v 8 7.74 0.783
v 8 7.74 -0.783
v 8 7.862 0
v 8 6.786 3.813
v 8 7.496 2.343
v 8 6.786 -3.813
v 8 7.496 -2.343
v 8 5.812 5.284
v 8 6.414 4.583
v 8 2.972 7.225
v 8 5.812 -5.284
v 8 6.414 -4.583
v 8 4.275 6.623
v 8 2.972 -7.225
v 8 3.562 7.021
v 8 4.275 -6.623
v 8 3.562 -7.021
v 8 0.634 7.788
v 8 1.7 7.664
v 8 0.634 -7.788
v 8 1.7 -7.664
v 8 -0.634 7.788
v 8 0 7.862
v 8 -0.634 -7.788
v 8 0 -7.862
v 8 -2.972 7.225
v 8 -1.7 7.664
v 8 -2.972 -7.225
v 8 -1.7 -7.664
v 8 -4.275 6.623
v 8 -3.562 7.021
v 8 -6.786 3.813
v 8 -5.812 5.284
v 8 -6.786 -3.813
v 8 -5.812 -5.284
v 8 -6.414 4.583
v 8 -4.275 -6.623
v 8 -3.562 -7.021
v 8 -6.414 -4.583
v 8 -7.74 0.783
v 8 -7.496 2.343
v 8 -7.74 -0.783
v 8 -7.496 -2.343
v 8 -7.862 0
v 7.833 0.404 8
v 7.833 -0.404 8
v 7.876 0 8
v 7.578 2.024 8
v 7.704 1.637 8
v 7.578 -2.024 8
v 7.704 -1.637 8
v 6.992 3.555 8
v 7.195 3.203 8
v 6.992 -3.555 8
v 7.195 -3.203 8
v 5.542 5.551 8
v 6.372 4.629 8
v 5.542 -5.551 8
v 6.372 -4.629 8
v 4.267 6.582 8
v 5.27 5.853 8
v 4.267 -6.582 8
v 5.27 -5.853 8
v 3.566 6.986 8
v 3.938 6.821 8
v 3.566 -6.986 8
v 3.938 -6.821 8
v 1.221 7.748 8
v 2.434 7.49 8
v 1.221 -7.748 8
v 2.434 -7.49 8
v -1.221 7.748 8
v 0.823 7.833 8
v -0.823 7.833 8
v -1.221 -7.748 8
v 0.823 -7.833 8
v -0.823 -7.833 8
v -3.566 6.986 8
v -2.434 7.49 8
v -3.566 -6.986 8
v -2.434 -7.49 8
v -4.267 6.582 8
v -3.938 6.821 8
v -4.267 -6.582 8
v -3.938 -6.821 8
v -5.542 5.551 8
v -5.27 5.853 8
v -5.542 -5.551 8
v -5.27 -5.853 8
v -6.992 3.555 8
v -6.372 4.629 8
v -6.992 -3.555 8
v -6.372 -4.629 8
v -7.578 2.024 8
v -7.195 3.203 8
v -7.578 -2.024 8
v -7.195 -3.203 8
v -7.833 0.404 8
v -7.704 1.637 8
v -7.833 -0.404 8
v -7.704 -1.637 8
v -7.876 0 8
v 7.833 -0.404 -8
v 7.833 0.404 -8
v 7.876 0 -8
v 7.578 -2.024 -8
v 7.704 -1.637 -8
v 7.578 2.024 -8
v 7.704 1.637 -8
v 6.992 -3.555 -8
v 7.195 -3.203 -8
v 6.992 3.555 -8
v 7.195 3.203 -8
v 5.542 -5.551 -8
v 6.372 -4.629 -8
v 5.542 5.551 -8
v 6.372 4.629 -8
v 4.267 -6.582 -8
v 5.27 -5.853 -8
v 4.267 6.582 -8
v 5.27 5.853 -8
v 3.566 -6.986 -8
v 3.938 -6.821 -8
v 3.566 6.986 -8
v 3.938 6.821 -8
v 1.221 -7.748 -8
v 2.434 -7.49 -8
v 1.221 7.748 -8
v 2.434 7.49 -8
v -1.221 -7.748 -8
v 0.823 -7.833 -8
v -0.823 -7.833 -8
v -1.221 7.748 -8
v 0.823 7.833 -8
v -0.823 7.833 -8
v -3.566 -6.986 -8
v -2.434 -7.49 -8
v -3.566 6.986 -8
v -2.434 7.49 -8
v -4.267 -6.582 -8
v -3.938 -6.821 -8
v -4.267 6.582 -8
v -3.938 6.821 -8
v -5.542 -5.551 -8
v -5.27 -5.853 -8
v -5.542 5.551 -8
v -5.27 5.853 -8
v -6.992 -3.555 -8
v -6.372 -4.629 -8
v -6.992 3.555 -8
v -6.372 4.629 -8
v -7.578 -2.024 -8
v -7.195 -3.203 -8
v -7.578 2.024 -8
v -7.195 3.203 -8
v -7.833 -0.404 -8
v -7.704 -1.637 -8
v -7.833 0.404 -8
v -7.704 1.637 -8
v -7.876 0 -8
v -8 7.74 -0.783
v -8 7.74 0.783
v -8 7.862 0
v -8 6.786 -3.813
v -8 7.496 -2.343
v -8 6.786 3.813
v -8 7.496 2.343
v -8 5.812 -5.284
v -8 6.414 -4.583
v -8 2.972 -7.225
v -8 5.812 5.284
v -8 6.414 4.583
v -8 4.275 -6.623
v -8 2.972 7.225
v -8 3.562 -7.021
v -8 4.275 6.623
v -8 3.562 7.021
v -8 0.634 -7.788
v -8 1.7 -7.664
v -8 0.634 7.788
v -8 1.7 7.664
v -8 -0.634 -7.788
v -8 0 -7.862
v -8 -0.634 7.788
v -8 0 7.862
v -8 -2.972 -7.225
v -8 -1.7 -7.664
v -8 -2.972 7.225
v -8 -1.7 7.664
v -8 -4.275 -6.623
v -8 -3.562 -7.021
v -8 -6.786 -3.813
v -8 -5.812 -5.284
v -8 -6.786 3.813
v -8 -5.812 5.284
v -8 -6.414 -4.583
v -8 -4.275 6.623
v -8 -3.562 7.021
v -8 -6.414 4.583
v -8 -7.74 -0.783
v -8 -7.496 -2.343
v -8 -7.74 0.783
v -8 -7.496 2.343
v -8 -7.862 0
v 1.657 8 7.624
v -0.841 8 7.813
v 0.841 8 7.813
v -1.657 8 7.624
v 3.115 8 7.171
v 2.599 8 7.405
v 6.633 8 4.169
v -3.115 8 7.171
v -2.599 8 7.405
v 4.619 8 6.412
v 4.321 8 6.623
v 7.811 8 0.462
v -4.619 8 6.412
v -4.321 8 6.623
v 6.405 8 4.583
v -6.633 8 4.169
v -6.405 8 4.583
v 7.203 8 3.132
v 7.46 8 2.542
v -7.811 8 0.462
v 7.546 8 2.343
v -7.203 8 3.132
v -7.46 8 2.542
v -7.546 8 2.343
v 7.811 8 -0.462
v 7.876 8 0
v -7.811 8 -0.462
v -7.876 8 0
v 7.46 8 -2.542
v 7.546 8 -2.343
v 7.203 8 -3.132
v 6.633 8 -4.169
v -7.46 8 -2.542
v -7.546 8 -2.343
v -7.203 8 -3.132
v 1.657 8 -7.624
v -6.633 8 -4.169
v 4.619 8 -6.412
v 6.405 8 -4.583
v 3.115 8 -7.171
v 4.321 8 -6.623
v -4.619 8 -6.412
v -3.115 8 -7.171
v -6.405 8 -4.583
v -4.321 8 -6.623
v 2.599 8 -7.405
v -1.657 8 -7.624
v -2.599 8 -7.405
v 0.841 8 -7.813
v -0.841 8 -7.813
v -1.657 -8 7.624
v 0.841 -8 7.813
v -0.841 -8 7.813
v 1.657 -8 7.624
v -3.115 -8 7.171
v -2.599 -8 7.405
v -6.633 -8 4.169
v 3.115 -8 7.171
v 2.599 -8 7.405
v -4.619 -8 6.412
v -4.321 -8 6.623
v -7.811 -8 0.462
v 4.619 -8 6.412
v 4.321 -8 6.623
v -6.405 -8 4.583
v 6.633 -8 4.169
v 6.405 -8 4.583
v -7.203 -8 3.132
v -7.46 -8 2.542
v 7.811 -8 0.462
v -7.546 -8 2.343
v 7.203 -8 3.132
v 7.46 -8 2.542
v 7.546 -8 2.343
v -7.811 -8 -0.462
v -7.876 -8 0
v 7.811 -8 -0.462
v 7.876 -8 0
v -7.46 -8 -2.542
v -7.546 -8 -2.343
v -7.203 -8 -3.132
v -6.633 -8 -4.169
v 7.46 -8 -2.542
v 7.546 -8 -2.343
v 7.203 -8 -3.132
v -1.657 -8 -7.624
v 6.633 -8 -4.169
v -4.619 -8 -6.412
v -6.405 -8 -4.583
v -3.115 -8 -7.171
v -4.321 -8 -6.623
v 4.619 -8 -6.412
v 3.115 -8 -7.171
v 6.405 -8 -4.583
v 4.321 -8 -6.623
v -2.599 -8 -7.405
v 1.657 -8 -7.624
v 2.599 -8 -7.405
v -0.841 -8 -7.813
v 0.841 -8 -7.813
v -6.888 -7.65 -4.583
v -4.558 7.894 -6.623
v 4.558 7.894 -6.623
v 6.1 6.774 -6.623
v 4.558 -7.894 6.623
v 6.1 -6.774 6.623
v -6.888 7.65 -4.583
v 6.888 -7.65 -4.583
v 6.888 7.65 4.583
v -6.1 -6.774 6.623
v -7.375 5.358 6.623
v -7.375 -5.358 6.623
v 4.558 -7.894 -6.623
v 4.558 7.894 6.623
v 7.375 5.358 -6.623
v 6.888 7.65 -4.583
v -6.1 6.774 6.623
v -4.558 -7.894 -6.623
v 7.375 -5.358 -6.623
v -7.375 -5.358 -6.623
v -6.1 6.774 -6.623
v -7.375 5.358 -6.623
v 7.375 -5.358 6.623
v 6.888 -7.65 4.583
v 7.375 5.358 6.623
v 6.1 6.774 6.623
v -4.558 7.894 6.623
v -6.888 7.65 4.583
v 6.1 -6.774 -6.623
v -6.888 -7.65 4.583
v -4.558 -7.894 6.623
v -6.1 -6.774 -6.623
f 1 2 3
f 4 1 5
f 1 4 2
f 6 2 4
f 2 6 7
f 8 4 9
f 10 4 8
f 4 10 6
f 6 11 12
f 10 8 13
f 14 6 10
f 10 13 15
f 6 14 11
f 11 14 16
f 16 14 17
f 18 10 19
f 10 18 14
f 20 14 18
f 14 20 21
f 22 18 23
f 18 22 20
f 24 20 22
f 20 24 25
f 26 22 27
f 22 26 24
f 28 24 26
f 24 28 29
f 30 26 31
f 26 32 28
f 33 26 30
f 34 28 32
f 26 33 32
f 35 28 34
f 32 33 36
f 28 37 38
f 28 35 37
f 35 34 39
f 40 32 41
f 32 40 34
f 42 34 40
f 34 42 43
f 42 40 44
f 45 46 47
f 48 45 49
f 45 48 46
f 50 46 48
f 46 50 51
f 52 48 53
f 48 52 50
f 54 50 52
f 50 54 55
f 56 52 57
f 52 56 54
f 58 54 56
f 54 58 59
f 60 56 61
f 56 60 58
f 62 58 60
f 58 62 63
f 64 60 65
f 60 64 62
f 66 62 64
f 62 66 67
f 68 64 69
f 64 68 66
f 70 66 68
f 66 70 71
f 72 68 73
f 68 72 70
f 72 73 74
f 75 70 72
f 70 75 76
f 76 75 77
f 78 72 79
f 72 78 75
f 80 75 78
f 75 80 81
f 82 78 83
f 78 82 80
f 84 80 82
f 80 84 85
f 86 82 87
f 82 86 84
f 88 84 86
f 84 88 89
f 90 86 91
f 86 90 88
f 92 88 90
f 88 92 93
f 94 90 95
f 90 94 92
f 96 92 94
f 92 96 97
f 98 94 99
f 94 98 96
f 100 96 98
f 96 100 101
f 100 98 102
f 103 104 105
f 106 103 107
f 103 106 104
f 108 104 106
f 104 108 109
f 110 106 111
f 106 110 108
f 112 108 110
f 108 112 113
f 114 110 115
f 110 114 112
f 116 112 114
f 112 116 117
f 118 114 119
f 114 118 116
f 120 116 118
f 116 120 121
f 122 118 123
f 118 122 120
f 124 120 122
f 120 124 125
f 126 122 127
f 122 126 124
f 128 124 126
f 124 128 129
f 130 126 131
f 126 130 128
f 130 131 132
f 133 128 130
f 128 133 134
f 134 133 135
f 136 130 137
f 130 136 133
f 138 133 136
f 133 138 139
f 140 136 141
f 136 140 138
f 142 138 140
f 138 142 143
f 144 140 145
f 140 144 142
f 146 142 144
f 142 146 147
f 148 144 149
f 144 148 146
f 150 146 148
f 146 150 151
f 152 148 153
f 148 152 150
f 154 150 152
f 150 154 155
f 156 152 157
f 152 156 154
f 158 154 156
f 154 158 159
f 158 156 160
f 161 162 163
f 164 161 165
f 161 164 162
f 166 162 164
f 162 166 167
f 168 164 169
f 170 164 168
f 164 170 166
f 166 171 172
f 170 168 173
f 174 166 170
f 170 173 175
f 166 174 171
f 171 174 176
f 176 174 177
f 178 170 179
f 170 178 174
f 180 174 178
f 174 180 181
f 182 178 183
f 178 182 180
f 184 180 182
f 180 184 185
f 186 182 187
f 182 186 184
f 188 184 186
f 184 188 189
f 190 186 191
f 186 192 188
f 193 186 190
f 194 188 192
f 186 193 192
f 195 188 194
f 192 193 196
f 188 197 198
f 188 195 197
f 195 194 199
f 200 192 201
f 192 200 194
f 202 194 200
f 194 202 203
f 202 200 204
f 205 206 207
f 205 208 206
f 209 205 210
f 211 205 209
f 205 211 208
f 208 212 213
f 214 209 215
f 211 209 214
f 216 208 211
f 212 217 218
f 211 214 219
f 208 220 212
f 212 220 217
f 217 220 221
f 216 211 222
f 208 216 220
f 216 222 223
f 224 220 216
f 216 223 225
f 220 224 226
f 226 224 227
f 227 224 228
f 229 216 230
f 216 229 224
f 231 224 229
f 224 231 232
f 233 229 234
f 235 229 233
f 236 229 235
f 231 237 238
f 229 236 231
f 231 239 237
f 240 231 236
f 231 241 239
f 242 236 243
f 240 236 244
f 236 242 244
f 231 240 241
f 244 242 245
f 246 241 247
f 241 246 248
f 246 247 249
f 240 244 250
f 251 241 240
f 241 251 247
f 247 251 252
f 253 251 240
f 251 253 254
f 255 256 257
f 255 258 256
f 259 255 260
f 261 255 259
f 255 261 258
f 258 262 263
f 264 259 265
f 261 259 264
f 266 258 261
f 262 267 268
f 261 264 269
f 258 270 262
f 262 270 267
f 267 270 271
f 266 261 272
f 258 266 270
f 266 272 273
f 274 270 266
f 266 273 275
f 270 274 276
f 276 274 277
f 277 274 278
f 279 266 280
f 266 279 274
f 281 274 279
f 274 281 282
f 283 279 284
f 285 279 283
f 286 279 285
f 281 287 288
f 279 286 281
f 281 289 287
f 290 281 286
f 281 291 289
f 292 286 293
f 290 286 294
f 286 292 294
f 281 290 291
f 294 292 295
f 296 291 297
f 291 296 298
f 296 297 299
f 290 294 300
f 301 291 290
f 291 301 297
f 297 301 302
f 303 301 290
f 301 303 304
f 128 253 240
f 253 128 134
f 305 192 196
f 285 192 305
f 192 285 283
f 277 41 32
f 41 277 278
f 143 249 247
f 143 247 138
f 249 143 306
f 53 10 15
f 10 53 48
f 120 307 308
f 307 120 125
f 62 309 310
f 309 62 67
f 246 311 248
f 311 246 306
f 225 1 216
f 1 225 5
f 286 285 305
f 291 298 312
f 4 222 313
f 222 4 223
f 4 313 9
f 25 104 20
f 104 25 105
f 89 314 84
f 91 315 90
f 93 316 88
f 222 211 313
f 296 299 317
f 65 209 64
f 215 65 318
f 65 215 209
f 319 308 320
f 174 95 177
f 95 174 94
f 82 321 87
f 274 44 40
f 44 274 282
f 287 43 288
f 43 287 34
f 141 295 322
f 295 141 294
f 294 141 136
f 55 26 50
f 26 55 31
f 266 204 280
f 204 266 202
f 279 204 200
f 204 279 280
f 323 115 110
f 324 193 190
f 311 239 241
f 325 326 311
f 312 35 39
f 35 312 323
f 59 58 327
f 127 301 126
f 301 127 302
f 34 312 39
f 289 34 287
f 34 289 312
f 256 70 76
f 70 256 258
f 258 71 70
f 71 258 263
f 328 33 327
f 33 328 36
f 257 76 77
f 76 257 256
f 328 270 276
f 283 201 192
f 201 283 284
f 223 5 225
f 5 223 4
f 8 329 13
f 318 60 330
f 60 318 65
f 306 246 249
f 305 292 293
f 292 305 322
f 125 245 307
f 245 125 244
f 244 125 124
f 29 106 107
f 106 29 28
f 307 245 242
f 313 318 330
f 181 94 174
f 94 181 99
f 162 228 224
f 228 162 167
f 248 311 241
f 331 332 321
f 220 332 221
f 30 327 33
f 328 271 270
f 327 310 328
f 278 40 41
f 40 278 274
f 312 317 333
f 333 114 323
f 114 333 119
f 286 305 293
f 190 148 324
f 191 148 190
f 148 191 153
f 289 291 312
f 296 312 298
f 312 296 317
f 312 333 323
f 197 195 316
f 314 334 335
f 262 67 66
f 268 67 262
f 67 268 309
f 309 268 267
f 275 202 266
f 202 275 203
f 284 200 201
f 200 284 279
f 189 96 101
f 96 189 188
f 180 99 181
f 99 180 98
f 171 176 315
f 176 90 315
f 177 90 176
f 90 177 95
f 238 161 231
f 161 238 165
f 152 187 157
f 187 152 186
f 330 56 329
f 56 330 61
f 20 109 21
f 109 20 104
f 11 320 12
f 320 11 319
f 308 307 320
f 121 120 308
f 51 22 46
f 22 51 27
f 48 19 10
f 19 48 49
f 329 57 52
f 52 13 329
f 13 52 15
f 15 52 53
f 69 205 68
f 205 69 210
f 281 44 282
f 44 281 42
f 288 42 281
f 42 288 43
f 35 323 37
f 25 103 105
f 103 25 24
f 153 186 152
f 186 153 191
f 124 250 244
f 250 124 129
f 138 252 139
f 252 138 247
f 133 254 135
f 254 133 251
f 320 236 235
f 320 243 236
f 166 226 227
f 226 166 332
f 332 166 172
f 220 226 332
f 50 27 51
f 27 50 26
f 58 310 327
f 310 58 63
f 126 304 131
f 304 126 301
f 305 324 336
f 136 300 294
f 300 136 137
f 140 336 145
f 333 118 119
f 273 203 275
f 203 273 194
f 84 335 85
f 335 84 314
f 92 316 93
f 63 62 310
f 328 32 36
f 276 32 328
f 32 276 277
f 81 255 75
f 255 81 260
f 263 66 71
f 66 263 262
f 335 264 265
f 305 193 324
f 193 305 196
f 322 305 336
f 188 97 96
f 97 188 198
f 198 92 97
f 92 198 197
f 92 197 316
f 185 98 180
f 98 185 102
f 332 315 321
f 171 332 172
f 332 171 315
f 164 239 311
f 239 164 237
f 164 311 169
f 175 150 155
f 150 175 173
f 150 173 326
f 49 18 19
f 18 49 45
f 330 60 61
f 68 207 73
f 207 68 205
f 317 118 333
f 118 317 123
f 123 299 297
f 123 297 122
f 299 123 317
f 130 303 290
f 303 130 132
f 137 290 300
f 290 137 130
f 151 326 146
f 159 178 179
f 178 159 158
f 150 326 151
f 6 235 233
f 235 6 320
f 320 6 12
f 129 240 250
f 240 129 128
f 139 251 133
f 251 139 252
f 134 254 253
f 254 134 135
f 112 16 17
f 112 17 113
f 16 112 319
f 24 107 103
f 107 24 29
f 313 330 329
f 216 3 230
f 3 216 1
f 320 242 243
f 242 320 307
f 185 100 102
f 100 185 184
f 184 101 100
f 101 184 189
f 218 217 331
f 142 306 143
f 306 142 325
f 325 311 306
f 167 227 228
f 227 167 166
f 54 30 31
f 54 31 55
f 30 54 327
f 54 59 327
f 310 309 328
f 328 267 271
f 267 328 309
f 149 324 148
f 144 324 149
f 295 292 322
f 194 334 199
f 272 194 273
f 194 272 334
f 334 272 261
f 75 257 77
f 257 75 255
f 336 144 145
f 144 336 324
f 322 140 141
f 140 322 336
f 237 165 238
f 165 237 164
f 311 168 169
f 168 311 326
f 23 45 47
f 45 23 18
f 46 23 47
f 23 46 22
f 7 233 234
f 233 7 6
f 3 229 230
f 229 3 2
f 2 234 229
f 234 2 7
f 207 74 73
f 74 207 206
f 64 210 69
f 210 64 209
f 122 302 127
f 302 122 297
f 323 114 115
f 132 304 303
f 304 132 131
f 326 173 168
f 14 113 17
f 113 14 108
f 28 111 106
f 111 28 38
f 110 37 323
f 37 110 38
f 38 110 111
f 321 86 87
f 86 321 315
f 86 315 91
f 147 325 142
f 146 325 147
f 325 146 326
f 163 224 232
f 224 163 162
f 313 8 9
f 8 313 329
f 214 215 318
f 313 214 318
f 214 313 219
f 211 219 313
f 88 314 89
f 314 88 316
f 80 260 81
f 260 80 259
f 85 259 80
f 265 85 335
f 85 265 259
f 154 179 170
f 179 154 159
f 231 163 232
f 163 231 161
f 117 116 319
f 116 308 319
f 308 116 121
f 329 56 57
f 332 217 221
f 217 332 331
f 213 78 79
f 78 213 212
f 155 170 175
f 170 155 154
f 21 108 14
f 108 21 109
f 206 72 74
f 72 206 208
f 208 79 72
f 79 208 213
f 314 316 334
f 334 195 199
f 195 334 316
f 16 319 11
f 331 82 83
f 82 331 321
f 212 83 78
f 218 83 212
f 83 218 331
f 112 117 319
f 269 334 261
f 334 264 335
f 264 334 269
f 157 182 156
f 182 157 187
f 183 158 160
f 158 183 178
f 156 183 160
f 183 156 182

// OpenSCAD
// [FL_INDEX: keywords="openscad, 3d_parametric, Customizable_dice_with_engraved_images, csg_solid" | COT="Parametric OpenSCAD design from 3DCodeverse"]
// Title: Customizable dice with engraved images

//Created by Ari M. Diacou, August 2013
//Shared under Creative Commons License: Attribution-ShareAlike 3.0 Unported (CC BY-SA 3.0) 
//see http://creativecommons.org/licenses/by-sa/3.0/

/*To get this to work offline, any image must be converted to a .dat file using the tool at http://customizer.makerbot.com/image_surface. That will output an array of values from 0-1 corresponding to the greyscale values 0-255 of the image. Inverting the colors of the image will ensure that the recessed image gets subracted from other objects properly. Copy the arry to a text file. IMPORTANT: be sure that your file is actually a dat file and not e.g. foo.dat.txt. Some operating systems (like Windows 7 by default) hide the actual extension. Once the dat files are in the same directory as the .scad file, and are named properly the surface() function should work.

The way I prepared my image files was to:
	1	Import the image into gimp.
	2	Crop the image as tightly as possible
	3	Right click on the image: Image>Scale Image
	4	With the aspect ratio locked, change the Higher of the width and height to 100 pixils.
	5	Right click on the image: Image>Canvas Size
	6	With the aspect ratio UNlocked, change the Lower of the width and height to 100 pixils. Click "Center". Click "Resize".
	7	Right click on the image: Colors>Brightness-Contrast
	8	Increase the contrast to remove the effects of the resize, and get sharper edges.
	9	Export the file to jpg/gif/bmp/png (it doesnt really matter as long as the customizer tool can read the file).
	10	Open  http://customizer.makerbot.com/image_surface in a web browser.
	11	Select the file you want to convert. Click "Invert Colors".
	12	Copy the array of numbers to a text file. 
	13	File>Save As. In the drop-down menu "Save as type:" select "All files". This will allow you to actually set the extenstion to ".dat". Name the file <whatever>.dat.
	
Your image should now ceate a surface() as intended. */


/* [Images] */
// Load a 100x100 pixel image for side 1. (images will be automatically stretched to fit) Simple, high contrast images like logos work best.
i1 = "skull.dat"; // [image_surface:100x100]
// Load a 100x100 pixel image for side 2. (images will be automatically stretched to fit) Simple, high contrast images like logos work best.
i2= "skull.dat"; // [image_surface:100x100]
// Load a 100x100 pixel image for side 3. (images will be automatically stretched to fit) Simple, high contrast images like logos work best.
i3= "skull.dat"; // [image_surface:100x100]
// Load a 100x100 pixel image for side 4. (images will be automatically stretched to fit) Simple, high contrast images like logos work best.
i4= "wshield.dat"; // [image_surface:100x100]
// Load a 100x100 pixel image for side 5. (images will be automatically stretched to fit) Simple, high contrast images like logos work best.
i5= "wshield.dat"; // [image_surface:100x100]
// Load a 100x100 pixel image for side 6. (images will be automatically stretched to fit) Simple, high contrast images like logos work best.
i6= "bshield.dat"; // [image_surface:100x100]
//What was the largest number of pixils in the image?
pixils=100;

/* [Dimensions] */
//Depth of indendations in mm
depth=.5;
//One side of the cube in mm
cube_size=16;
//How big should your image be in mm?
image_size=12;
//How much of the corners should be cut off? Higher is more spherical, 1 is a cube. Recommend 1.0-2.0.
curvature=1.42;

/* [Hidden] */
image=[i1,i2,i3,i4,i5,i6];
//How each die surface is rotated
rot=[[0,0,0],[90,0,0],[180,0,0],[270,0,0],[0,90,0],[0,-90,0]];
intersection(){ //Each side is a cube minus the image, the die is the intersection of all the cubes
	sphere(cube_size/curvature);
	side(1); //Interestingly, if you call "for(i=[1:6]){side(i);}" instead here, it won't work.
	side(2);
	side(3);
	side(4);
	side(5);
	side(6);
	}
module side(side_num){
//this function takes the surface, scales it to the right size then subtracts the surface from the cube. The resulting cube is then rotated into the correct position.
	rotate(rot[side_num-1])	
		difference(){
			cube(cube_size,true);
			translate([0,0,cube_size/2]) 
				scale([image_size/pixils,image_size/pixils,-depth]) 
					surface(file=image[side_num-1], center=true, convexity=10);
			}
	}
